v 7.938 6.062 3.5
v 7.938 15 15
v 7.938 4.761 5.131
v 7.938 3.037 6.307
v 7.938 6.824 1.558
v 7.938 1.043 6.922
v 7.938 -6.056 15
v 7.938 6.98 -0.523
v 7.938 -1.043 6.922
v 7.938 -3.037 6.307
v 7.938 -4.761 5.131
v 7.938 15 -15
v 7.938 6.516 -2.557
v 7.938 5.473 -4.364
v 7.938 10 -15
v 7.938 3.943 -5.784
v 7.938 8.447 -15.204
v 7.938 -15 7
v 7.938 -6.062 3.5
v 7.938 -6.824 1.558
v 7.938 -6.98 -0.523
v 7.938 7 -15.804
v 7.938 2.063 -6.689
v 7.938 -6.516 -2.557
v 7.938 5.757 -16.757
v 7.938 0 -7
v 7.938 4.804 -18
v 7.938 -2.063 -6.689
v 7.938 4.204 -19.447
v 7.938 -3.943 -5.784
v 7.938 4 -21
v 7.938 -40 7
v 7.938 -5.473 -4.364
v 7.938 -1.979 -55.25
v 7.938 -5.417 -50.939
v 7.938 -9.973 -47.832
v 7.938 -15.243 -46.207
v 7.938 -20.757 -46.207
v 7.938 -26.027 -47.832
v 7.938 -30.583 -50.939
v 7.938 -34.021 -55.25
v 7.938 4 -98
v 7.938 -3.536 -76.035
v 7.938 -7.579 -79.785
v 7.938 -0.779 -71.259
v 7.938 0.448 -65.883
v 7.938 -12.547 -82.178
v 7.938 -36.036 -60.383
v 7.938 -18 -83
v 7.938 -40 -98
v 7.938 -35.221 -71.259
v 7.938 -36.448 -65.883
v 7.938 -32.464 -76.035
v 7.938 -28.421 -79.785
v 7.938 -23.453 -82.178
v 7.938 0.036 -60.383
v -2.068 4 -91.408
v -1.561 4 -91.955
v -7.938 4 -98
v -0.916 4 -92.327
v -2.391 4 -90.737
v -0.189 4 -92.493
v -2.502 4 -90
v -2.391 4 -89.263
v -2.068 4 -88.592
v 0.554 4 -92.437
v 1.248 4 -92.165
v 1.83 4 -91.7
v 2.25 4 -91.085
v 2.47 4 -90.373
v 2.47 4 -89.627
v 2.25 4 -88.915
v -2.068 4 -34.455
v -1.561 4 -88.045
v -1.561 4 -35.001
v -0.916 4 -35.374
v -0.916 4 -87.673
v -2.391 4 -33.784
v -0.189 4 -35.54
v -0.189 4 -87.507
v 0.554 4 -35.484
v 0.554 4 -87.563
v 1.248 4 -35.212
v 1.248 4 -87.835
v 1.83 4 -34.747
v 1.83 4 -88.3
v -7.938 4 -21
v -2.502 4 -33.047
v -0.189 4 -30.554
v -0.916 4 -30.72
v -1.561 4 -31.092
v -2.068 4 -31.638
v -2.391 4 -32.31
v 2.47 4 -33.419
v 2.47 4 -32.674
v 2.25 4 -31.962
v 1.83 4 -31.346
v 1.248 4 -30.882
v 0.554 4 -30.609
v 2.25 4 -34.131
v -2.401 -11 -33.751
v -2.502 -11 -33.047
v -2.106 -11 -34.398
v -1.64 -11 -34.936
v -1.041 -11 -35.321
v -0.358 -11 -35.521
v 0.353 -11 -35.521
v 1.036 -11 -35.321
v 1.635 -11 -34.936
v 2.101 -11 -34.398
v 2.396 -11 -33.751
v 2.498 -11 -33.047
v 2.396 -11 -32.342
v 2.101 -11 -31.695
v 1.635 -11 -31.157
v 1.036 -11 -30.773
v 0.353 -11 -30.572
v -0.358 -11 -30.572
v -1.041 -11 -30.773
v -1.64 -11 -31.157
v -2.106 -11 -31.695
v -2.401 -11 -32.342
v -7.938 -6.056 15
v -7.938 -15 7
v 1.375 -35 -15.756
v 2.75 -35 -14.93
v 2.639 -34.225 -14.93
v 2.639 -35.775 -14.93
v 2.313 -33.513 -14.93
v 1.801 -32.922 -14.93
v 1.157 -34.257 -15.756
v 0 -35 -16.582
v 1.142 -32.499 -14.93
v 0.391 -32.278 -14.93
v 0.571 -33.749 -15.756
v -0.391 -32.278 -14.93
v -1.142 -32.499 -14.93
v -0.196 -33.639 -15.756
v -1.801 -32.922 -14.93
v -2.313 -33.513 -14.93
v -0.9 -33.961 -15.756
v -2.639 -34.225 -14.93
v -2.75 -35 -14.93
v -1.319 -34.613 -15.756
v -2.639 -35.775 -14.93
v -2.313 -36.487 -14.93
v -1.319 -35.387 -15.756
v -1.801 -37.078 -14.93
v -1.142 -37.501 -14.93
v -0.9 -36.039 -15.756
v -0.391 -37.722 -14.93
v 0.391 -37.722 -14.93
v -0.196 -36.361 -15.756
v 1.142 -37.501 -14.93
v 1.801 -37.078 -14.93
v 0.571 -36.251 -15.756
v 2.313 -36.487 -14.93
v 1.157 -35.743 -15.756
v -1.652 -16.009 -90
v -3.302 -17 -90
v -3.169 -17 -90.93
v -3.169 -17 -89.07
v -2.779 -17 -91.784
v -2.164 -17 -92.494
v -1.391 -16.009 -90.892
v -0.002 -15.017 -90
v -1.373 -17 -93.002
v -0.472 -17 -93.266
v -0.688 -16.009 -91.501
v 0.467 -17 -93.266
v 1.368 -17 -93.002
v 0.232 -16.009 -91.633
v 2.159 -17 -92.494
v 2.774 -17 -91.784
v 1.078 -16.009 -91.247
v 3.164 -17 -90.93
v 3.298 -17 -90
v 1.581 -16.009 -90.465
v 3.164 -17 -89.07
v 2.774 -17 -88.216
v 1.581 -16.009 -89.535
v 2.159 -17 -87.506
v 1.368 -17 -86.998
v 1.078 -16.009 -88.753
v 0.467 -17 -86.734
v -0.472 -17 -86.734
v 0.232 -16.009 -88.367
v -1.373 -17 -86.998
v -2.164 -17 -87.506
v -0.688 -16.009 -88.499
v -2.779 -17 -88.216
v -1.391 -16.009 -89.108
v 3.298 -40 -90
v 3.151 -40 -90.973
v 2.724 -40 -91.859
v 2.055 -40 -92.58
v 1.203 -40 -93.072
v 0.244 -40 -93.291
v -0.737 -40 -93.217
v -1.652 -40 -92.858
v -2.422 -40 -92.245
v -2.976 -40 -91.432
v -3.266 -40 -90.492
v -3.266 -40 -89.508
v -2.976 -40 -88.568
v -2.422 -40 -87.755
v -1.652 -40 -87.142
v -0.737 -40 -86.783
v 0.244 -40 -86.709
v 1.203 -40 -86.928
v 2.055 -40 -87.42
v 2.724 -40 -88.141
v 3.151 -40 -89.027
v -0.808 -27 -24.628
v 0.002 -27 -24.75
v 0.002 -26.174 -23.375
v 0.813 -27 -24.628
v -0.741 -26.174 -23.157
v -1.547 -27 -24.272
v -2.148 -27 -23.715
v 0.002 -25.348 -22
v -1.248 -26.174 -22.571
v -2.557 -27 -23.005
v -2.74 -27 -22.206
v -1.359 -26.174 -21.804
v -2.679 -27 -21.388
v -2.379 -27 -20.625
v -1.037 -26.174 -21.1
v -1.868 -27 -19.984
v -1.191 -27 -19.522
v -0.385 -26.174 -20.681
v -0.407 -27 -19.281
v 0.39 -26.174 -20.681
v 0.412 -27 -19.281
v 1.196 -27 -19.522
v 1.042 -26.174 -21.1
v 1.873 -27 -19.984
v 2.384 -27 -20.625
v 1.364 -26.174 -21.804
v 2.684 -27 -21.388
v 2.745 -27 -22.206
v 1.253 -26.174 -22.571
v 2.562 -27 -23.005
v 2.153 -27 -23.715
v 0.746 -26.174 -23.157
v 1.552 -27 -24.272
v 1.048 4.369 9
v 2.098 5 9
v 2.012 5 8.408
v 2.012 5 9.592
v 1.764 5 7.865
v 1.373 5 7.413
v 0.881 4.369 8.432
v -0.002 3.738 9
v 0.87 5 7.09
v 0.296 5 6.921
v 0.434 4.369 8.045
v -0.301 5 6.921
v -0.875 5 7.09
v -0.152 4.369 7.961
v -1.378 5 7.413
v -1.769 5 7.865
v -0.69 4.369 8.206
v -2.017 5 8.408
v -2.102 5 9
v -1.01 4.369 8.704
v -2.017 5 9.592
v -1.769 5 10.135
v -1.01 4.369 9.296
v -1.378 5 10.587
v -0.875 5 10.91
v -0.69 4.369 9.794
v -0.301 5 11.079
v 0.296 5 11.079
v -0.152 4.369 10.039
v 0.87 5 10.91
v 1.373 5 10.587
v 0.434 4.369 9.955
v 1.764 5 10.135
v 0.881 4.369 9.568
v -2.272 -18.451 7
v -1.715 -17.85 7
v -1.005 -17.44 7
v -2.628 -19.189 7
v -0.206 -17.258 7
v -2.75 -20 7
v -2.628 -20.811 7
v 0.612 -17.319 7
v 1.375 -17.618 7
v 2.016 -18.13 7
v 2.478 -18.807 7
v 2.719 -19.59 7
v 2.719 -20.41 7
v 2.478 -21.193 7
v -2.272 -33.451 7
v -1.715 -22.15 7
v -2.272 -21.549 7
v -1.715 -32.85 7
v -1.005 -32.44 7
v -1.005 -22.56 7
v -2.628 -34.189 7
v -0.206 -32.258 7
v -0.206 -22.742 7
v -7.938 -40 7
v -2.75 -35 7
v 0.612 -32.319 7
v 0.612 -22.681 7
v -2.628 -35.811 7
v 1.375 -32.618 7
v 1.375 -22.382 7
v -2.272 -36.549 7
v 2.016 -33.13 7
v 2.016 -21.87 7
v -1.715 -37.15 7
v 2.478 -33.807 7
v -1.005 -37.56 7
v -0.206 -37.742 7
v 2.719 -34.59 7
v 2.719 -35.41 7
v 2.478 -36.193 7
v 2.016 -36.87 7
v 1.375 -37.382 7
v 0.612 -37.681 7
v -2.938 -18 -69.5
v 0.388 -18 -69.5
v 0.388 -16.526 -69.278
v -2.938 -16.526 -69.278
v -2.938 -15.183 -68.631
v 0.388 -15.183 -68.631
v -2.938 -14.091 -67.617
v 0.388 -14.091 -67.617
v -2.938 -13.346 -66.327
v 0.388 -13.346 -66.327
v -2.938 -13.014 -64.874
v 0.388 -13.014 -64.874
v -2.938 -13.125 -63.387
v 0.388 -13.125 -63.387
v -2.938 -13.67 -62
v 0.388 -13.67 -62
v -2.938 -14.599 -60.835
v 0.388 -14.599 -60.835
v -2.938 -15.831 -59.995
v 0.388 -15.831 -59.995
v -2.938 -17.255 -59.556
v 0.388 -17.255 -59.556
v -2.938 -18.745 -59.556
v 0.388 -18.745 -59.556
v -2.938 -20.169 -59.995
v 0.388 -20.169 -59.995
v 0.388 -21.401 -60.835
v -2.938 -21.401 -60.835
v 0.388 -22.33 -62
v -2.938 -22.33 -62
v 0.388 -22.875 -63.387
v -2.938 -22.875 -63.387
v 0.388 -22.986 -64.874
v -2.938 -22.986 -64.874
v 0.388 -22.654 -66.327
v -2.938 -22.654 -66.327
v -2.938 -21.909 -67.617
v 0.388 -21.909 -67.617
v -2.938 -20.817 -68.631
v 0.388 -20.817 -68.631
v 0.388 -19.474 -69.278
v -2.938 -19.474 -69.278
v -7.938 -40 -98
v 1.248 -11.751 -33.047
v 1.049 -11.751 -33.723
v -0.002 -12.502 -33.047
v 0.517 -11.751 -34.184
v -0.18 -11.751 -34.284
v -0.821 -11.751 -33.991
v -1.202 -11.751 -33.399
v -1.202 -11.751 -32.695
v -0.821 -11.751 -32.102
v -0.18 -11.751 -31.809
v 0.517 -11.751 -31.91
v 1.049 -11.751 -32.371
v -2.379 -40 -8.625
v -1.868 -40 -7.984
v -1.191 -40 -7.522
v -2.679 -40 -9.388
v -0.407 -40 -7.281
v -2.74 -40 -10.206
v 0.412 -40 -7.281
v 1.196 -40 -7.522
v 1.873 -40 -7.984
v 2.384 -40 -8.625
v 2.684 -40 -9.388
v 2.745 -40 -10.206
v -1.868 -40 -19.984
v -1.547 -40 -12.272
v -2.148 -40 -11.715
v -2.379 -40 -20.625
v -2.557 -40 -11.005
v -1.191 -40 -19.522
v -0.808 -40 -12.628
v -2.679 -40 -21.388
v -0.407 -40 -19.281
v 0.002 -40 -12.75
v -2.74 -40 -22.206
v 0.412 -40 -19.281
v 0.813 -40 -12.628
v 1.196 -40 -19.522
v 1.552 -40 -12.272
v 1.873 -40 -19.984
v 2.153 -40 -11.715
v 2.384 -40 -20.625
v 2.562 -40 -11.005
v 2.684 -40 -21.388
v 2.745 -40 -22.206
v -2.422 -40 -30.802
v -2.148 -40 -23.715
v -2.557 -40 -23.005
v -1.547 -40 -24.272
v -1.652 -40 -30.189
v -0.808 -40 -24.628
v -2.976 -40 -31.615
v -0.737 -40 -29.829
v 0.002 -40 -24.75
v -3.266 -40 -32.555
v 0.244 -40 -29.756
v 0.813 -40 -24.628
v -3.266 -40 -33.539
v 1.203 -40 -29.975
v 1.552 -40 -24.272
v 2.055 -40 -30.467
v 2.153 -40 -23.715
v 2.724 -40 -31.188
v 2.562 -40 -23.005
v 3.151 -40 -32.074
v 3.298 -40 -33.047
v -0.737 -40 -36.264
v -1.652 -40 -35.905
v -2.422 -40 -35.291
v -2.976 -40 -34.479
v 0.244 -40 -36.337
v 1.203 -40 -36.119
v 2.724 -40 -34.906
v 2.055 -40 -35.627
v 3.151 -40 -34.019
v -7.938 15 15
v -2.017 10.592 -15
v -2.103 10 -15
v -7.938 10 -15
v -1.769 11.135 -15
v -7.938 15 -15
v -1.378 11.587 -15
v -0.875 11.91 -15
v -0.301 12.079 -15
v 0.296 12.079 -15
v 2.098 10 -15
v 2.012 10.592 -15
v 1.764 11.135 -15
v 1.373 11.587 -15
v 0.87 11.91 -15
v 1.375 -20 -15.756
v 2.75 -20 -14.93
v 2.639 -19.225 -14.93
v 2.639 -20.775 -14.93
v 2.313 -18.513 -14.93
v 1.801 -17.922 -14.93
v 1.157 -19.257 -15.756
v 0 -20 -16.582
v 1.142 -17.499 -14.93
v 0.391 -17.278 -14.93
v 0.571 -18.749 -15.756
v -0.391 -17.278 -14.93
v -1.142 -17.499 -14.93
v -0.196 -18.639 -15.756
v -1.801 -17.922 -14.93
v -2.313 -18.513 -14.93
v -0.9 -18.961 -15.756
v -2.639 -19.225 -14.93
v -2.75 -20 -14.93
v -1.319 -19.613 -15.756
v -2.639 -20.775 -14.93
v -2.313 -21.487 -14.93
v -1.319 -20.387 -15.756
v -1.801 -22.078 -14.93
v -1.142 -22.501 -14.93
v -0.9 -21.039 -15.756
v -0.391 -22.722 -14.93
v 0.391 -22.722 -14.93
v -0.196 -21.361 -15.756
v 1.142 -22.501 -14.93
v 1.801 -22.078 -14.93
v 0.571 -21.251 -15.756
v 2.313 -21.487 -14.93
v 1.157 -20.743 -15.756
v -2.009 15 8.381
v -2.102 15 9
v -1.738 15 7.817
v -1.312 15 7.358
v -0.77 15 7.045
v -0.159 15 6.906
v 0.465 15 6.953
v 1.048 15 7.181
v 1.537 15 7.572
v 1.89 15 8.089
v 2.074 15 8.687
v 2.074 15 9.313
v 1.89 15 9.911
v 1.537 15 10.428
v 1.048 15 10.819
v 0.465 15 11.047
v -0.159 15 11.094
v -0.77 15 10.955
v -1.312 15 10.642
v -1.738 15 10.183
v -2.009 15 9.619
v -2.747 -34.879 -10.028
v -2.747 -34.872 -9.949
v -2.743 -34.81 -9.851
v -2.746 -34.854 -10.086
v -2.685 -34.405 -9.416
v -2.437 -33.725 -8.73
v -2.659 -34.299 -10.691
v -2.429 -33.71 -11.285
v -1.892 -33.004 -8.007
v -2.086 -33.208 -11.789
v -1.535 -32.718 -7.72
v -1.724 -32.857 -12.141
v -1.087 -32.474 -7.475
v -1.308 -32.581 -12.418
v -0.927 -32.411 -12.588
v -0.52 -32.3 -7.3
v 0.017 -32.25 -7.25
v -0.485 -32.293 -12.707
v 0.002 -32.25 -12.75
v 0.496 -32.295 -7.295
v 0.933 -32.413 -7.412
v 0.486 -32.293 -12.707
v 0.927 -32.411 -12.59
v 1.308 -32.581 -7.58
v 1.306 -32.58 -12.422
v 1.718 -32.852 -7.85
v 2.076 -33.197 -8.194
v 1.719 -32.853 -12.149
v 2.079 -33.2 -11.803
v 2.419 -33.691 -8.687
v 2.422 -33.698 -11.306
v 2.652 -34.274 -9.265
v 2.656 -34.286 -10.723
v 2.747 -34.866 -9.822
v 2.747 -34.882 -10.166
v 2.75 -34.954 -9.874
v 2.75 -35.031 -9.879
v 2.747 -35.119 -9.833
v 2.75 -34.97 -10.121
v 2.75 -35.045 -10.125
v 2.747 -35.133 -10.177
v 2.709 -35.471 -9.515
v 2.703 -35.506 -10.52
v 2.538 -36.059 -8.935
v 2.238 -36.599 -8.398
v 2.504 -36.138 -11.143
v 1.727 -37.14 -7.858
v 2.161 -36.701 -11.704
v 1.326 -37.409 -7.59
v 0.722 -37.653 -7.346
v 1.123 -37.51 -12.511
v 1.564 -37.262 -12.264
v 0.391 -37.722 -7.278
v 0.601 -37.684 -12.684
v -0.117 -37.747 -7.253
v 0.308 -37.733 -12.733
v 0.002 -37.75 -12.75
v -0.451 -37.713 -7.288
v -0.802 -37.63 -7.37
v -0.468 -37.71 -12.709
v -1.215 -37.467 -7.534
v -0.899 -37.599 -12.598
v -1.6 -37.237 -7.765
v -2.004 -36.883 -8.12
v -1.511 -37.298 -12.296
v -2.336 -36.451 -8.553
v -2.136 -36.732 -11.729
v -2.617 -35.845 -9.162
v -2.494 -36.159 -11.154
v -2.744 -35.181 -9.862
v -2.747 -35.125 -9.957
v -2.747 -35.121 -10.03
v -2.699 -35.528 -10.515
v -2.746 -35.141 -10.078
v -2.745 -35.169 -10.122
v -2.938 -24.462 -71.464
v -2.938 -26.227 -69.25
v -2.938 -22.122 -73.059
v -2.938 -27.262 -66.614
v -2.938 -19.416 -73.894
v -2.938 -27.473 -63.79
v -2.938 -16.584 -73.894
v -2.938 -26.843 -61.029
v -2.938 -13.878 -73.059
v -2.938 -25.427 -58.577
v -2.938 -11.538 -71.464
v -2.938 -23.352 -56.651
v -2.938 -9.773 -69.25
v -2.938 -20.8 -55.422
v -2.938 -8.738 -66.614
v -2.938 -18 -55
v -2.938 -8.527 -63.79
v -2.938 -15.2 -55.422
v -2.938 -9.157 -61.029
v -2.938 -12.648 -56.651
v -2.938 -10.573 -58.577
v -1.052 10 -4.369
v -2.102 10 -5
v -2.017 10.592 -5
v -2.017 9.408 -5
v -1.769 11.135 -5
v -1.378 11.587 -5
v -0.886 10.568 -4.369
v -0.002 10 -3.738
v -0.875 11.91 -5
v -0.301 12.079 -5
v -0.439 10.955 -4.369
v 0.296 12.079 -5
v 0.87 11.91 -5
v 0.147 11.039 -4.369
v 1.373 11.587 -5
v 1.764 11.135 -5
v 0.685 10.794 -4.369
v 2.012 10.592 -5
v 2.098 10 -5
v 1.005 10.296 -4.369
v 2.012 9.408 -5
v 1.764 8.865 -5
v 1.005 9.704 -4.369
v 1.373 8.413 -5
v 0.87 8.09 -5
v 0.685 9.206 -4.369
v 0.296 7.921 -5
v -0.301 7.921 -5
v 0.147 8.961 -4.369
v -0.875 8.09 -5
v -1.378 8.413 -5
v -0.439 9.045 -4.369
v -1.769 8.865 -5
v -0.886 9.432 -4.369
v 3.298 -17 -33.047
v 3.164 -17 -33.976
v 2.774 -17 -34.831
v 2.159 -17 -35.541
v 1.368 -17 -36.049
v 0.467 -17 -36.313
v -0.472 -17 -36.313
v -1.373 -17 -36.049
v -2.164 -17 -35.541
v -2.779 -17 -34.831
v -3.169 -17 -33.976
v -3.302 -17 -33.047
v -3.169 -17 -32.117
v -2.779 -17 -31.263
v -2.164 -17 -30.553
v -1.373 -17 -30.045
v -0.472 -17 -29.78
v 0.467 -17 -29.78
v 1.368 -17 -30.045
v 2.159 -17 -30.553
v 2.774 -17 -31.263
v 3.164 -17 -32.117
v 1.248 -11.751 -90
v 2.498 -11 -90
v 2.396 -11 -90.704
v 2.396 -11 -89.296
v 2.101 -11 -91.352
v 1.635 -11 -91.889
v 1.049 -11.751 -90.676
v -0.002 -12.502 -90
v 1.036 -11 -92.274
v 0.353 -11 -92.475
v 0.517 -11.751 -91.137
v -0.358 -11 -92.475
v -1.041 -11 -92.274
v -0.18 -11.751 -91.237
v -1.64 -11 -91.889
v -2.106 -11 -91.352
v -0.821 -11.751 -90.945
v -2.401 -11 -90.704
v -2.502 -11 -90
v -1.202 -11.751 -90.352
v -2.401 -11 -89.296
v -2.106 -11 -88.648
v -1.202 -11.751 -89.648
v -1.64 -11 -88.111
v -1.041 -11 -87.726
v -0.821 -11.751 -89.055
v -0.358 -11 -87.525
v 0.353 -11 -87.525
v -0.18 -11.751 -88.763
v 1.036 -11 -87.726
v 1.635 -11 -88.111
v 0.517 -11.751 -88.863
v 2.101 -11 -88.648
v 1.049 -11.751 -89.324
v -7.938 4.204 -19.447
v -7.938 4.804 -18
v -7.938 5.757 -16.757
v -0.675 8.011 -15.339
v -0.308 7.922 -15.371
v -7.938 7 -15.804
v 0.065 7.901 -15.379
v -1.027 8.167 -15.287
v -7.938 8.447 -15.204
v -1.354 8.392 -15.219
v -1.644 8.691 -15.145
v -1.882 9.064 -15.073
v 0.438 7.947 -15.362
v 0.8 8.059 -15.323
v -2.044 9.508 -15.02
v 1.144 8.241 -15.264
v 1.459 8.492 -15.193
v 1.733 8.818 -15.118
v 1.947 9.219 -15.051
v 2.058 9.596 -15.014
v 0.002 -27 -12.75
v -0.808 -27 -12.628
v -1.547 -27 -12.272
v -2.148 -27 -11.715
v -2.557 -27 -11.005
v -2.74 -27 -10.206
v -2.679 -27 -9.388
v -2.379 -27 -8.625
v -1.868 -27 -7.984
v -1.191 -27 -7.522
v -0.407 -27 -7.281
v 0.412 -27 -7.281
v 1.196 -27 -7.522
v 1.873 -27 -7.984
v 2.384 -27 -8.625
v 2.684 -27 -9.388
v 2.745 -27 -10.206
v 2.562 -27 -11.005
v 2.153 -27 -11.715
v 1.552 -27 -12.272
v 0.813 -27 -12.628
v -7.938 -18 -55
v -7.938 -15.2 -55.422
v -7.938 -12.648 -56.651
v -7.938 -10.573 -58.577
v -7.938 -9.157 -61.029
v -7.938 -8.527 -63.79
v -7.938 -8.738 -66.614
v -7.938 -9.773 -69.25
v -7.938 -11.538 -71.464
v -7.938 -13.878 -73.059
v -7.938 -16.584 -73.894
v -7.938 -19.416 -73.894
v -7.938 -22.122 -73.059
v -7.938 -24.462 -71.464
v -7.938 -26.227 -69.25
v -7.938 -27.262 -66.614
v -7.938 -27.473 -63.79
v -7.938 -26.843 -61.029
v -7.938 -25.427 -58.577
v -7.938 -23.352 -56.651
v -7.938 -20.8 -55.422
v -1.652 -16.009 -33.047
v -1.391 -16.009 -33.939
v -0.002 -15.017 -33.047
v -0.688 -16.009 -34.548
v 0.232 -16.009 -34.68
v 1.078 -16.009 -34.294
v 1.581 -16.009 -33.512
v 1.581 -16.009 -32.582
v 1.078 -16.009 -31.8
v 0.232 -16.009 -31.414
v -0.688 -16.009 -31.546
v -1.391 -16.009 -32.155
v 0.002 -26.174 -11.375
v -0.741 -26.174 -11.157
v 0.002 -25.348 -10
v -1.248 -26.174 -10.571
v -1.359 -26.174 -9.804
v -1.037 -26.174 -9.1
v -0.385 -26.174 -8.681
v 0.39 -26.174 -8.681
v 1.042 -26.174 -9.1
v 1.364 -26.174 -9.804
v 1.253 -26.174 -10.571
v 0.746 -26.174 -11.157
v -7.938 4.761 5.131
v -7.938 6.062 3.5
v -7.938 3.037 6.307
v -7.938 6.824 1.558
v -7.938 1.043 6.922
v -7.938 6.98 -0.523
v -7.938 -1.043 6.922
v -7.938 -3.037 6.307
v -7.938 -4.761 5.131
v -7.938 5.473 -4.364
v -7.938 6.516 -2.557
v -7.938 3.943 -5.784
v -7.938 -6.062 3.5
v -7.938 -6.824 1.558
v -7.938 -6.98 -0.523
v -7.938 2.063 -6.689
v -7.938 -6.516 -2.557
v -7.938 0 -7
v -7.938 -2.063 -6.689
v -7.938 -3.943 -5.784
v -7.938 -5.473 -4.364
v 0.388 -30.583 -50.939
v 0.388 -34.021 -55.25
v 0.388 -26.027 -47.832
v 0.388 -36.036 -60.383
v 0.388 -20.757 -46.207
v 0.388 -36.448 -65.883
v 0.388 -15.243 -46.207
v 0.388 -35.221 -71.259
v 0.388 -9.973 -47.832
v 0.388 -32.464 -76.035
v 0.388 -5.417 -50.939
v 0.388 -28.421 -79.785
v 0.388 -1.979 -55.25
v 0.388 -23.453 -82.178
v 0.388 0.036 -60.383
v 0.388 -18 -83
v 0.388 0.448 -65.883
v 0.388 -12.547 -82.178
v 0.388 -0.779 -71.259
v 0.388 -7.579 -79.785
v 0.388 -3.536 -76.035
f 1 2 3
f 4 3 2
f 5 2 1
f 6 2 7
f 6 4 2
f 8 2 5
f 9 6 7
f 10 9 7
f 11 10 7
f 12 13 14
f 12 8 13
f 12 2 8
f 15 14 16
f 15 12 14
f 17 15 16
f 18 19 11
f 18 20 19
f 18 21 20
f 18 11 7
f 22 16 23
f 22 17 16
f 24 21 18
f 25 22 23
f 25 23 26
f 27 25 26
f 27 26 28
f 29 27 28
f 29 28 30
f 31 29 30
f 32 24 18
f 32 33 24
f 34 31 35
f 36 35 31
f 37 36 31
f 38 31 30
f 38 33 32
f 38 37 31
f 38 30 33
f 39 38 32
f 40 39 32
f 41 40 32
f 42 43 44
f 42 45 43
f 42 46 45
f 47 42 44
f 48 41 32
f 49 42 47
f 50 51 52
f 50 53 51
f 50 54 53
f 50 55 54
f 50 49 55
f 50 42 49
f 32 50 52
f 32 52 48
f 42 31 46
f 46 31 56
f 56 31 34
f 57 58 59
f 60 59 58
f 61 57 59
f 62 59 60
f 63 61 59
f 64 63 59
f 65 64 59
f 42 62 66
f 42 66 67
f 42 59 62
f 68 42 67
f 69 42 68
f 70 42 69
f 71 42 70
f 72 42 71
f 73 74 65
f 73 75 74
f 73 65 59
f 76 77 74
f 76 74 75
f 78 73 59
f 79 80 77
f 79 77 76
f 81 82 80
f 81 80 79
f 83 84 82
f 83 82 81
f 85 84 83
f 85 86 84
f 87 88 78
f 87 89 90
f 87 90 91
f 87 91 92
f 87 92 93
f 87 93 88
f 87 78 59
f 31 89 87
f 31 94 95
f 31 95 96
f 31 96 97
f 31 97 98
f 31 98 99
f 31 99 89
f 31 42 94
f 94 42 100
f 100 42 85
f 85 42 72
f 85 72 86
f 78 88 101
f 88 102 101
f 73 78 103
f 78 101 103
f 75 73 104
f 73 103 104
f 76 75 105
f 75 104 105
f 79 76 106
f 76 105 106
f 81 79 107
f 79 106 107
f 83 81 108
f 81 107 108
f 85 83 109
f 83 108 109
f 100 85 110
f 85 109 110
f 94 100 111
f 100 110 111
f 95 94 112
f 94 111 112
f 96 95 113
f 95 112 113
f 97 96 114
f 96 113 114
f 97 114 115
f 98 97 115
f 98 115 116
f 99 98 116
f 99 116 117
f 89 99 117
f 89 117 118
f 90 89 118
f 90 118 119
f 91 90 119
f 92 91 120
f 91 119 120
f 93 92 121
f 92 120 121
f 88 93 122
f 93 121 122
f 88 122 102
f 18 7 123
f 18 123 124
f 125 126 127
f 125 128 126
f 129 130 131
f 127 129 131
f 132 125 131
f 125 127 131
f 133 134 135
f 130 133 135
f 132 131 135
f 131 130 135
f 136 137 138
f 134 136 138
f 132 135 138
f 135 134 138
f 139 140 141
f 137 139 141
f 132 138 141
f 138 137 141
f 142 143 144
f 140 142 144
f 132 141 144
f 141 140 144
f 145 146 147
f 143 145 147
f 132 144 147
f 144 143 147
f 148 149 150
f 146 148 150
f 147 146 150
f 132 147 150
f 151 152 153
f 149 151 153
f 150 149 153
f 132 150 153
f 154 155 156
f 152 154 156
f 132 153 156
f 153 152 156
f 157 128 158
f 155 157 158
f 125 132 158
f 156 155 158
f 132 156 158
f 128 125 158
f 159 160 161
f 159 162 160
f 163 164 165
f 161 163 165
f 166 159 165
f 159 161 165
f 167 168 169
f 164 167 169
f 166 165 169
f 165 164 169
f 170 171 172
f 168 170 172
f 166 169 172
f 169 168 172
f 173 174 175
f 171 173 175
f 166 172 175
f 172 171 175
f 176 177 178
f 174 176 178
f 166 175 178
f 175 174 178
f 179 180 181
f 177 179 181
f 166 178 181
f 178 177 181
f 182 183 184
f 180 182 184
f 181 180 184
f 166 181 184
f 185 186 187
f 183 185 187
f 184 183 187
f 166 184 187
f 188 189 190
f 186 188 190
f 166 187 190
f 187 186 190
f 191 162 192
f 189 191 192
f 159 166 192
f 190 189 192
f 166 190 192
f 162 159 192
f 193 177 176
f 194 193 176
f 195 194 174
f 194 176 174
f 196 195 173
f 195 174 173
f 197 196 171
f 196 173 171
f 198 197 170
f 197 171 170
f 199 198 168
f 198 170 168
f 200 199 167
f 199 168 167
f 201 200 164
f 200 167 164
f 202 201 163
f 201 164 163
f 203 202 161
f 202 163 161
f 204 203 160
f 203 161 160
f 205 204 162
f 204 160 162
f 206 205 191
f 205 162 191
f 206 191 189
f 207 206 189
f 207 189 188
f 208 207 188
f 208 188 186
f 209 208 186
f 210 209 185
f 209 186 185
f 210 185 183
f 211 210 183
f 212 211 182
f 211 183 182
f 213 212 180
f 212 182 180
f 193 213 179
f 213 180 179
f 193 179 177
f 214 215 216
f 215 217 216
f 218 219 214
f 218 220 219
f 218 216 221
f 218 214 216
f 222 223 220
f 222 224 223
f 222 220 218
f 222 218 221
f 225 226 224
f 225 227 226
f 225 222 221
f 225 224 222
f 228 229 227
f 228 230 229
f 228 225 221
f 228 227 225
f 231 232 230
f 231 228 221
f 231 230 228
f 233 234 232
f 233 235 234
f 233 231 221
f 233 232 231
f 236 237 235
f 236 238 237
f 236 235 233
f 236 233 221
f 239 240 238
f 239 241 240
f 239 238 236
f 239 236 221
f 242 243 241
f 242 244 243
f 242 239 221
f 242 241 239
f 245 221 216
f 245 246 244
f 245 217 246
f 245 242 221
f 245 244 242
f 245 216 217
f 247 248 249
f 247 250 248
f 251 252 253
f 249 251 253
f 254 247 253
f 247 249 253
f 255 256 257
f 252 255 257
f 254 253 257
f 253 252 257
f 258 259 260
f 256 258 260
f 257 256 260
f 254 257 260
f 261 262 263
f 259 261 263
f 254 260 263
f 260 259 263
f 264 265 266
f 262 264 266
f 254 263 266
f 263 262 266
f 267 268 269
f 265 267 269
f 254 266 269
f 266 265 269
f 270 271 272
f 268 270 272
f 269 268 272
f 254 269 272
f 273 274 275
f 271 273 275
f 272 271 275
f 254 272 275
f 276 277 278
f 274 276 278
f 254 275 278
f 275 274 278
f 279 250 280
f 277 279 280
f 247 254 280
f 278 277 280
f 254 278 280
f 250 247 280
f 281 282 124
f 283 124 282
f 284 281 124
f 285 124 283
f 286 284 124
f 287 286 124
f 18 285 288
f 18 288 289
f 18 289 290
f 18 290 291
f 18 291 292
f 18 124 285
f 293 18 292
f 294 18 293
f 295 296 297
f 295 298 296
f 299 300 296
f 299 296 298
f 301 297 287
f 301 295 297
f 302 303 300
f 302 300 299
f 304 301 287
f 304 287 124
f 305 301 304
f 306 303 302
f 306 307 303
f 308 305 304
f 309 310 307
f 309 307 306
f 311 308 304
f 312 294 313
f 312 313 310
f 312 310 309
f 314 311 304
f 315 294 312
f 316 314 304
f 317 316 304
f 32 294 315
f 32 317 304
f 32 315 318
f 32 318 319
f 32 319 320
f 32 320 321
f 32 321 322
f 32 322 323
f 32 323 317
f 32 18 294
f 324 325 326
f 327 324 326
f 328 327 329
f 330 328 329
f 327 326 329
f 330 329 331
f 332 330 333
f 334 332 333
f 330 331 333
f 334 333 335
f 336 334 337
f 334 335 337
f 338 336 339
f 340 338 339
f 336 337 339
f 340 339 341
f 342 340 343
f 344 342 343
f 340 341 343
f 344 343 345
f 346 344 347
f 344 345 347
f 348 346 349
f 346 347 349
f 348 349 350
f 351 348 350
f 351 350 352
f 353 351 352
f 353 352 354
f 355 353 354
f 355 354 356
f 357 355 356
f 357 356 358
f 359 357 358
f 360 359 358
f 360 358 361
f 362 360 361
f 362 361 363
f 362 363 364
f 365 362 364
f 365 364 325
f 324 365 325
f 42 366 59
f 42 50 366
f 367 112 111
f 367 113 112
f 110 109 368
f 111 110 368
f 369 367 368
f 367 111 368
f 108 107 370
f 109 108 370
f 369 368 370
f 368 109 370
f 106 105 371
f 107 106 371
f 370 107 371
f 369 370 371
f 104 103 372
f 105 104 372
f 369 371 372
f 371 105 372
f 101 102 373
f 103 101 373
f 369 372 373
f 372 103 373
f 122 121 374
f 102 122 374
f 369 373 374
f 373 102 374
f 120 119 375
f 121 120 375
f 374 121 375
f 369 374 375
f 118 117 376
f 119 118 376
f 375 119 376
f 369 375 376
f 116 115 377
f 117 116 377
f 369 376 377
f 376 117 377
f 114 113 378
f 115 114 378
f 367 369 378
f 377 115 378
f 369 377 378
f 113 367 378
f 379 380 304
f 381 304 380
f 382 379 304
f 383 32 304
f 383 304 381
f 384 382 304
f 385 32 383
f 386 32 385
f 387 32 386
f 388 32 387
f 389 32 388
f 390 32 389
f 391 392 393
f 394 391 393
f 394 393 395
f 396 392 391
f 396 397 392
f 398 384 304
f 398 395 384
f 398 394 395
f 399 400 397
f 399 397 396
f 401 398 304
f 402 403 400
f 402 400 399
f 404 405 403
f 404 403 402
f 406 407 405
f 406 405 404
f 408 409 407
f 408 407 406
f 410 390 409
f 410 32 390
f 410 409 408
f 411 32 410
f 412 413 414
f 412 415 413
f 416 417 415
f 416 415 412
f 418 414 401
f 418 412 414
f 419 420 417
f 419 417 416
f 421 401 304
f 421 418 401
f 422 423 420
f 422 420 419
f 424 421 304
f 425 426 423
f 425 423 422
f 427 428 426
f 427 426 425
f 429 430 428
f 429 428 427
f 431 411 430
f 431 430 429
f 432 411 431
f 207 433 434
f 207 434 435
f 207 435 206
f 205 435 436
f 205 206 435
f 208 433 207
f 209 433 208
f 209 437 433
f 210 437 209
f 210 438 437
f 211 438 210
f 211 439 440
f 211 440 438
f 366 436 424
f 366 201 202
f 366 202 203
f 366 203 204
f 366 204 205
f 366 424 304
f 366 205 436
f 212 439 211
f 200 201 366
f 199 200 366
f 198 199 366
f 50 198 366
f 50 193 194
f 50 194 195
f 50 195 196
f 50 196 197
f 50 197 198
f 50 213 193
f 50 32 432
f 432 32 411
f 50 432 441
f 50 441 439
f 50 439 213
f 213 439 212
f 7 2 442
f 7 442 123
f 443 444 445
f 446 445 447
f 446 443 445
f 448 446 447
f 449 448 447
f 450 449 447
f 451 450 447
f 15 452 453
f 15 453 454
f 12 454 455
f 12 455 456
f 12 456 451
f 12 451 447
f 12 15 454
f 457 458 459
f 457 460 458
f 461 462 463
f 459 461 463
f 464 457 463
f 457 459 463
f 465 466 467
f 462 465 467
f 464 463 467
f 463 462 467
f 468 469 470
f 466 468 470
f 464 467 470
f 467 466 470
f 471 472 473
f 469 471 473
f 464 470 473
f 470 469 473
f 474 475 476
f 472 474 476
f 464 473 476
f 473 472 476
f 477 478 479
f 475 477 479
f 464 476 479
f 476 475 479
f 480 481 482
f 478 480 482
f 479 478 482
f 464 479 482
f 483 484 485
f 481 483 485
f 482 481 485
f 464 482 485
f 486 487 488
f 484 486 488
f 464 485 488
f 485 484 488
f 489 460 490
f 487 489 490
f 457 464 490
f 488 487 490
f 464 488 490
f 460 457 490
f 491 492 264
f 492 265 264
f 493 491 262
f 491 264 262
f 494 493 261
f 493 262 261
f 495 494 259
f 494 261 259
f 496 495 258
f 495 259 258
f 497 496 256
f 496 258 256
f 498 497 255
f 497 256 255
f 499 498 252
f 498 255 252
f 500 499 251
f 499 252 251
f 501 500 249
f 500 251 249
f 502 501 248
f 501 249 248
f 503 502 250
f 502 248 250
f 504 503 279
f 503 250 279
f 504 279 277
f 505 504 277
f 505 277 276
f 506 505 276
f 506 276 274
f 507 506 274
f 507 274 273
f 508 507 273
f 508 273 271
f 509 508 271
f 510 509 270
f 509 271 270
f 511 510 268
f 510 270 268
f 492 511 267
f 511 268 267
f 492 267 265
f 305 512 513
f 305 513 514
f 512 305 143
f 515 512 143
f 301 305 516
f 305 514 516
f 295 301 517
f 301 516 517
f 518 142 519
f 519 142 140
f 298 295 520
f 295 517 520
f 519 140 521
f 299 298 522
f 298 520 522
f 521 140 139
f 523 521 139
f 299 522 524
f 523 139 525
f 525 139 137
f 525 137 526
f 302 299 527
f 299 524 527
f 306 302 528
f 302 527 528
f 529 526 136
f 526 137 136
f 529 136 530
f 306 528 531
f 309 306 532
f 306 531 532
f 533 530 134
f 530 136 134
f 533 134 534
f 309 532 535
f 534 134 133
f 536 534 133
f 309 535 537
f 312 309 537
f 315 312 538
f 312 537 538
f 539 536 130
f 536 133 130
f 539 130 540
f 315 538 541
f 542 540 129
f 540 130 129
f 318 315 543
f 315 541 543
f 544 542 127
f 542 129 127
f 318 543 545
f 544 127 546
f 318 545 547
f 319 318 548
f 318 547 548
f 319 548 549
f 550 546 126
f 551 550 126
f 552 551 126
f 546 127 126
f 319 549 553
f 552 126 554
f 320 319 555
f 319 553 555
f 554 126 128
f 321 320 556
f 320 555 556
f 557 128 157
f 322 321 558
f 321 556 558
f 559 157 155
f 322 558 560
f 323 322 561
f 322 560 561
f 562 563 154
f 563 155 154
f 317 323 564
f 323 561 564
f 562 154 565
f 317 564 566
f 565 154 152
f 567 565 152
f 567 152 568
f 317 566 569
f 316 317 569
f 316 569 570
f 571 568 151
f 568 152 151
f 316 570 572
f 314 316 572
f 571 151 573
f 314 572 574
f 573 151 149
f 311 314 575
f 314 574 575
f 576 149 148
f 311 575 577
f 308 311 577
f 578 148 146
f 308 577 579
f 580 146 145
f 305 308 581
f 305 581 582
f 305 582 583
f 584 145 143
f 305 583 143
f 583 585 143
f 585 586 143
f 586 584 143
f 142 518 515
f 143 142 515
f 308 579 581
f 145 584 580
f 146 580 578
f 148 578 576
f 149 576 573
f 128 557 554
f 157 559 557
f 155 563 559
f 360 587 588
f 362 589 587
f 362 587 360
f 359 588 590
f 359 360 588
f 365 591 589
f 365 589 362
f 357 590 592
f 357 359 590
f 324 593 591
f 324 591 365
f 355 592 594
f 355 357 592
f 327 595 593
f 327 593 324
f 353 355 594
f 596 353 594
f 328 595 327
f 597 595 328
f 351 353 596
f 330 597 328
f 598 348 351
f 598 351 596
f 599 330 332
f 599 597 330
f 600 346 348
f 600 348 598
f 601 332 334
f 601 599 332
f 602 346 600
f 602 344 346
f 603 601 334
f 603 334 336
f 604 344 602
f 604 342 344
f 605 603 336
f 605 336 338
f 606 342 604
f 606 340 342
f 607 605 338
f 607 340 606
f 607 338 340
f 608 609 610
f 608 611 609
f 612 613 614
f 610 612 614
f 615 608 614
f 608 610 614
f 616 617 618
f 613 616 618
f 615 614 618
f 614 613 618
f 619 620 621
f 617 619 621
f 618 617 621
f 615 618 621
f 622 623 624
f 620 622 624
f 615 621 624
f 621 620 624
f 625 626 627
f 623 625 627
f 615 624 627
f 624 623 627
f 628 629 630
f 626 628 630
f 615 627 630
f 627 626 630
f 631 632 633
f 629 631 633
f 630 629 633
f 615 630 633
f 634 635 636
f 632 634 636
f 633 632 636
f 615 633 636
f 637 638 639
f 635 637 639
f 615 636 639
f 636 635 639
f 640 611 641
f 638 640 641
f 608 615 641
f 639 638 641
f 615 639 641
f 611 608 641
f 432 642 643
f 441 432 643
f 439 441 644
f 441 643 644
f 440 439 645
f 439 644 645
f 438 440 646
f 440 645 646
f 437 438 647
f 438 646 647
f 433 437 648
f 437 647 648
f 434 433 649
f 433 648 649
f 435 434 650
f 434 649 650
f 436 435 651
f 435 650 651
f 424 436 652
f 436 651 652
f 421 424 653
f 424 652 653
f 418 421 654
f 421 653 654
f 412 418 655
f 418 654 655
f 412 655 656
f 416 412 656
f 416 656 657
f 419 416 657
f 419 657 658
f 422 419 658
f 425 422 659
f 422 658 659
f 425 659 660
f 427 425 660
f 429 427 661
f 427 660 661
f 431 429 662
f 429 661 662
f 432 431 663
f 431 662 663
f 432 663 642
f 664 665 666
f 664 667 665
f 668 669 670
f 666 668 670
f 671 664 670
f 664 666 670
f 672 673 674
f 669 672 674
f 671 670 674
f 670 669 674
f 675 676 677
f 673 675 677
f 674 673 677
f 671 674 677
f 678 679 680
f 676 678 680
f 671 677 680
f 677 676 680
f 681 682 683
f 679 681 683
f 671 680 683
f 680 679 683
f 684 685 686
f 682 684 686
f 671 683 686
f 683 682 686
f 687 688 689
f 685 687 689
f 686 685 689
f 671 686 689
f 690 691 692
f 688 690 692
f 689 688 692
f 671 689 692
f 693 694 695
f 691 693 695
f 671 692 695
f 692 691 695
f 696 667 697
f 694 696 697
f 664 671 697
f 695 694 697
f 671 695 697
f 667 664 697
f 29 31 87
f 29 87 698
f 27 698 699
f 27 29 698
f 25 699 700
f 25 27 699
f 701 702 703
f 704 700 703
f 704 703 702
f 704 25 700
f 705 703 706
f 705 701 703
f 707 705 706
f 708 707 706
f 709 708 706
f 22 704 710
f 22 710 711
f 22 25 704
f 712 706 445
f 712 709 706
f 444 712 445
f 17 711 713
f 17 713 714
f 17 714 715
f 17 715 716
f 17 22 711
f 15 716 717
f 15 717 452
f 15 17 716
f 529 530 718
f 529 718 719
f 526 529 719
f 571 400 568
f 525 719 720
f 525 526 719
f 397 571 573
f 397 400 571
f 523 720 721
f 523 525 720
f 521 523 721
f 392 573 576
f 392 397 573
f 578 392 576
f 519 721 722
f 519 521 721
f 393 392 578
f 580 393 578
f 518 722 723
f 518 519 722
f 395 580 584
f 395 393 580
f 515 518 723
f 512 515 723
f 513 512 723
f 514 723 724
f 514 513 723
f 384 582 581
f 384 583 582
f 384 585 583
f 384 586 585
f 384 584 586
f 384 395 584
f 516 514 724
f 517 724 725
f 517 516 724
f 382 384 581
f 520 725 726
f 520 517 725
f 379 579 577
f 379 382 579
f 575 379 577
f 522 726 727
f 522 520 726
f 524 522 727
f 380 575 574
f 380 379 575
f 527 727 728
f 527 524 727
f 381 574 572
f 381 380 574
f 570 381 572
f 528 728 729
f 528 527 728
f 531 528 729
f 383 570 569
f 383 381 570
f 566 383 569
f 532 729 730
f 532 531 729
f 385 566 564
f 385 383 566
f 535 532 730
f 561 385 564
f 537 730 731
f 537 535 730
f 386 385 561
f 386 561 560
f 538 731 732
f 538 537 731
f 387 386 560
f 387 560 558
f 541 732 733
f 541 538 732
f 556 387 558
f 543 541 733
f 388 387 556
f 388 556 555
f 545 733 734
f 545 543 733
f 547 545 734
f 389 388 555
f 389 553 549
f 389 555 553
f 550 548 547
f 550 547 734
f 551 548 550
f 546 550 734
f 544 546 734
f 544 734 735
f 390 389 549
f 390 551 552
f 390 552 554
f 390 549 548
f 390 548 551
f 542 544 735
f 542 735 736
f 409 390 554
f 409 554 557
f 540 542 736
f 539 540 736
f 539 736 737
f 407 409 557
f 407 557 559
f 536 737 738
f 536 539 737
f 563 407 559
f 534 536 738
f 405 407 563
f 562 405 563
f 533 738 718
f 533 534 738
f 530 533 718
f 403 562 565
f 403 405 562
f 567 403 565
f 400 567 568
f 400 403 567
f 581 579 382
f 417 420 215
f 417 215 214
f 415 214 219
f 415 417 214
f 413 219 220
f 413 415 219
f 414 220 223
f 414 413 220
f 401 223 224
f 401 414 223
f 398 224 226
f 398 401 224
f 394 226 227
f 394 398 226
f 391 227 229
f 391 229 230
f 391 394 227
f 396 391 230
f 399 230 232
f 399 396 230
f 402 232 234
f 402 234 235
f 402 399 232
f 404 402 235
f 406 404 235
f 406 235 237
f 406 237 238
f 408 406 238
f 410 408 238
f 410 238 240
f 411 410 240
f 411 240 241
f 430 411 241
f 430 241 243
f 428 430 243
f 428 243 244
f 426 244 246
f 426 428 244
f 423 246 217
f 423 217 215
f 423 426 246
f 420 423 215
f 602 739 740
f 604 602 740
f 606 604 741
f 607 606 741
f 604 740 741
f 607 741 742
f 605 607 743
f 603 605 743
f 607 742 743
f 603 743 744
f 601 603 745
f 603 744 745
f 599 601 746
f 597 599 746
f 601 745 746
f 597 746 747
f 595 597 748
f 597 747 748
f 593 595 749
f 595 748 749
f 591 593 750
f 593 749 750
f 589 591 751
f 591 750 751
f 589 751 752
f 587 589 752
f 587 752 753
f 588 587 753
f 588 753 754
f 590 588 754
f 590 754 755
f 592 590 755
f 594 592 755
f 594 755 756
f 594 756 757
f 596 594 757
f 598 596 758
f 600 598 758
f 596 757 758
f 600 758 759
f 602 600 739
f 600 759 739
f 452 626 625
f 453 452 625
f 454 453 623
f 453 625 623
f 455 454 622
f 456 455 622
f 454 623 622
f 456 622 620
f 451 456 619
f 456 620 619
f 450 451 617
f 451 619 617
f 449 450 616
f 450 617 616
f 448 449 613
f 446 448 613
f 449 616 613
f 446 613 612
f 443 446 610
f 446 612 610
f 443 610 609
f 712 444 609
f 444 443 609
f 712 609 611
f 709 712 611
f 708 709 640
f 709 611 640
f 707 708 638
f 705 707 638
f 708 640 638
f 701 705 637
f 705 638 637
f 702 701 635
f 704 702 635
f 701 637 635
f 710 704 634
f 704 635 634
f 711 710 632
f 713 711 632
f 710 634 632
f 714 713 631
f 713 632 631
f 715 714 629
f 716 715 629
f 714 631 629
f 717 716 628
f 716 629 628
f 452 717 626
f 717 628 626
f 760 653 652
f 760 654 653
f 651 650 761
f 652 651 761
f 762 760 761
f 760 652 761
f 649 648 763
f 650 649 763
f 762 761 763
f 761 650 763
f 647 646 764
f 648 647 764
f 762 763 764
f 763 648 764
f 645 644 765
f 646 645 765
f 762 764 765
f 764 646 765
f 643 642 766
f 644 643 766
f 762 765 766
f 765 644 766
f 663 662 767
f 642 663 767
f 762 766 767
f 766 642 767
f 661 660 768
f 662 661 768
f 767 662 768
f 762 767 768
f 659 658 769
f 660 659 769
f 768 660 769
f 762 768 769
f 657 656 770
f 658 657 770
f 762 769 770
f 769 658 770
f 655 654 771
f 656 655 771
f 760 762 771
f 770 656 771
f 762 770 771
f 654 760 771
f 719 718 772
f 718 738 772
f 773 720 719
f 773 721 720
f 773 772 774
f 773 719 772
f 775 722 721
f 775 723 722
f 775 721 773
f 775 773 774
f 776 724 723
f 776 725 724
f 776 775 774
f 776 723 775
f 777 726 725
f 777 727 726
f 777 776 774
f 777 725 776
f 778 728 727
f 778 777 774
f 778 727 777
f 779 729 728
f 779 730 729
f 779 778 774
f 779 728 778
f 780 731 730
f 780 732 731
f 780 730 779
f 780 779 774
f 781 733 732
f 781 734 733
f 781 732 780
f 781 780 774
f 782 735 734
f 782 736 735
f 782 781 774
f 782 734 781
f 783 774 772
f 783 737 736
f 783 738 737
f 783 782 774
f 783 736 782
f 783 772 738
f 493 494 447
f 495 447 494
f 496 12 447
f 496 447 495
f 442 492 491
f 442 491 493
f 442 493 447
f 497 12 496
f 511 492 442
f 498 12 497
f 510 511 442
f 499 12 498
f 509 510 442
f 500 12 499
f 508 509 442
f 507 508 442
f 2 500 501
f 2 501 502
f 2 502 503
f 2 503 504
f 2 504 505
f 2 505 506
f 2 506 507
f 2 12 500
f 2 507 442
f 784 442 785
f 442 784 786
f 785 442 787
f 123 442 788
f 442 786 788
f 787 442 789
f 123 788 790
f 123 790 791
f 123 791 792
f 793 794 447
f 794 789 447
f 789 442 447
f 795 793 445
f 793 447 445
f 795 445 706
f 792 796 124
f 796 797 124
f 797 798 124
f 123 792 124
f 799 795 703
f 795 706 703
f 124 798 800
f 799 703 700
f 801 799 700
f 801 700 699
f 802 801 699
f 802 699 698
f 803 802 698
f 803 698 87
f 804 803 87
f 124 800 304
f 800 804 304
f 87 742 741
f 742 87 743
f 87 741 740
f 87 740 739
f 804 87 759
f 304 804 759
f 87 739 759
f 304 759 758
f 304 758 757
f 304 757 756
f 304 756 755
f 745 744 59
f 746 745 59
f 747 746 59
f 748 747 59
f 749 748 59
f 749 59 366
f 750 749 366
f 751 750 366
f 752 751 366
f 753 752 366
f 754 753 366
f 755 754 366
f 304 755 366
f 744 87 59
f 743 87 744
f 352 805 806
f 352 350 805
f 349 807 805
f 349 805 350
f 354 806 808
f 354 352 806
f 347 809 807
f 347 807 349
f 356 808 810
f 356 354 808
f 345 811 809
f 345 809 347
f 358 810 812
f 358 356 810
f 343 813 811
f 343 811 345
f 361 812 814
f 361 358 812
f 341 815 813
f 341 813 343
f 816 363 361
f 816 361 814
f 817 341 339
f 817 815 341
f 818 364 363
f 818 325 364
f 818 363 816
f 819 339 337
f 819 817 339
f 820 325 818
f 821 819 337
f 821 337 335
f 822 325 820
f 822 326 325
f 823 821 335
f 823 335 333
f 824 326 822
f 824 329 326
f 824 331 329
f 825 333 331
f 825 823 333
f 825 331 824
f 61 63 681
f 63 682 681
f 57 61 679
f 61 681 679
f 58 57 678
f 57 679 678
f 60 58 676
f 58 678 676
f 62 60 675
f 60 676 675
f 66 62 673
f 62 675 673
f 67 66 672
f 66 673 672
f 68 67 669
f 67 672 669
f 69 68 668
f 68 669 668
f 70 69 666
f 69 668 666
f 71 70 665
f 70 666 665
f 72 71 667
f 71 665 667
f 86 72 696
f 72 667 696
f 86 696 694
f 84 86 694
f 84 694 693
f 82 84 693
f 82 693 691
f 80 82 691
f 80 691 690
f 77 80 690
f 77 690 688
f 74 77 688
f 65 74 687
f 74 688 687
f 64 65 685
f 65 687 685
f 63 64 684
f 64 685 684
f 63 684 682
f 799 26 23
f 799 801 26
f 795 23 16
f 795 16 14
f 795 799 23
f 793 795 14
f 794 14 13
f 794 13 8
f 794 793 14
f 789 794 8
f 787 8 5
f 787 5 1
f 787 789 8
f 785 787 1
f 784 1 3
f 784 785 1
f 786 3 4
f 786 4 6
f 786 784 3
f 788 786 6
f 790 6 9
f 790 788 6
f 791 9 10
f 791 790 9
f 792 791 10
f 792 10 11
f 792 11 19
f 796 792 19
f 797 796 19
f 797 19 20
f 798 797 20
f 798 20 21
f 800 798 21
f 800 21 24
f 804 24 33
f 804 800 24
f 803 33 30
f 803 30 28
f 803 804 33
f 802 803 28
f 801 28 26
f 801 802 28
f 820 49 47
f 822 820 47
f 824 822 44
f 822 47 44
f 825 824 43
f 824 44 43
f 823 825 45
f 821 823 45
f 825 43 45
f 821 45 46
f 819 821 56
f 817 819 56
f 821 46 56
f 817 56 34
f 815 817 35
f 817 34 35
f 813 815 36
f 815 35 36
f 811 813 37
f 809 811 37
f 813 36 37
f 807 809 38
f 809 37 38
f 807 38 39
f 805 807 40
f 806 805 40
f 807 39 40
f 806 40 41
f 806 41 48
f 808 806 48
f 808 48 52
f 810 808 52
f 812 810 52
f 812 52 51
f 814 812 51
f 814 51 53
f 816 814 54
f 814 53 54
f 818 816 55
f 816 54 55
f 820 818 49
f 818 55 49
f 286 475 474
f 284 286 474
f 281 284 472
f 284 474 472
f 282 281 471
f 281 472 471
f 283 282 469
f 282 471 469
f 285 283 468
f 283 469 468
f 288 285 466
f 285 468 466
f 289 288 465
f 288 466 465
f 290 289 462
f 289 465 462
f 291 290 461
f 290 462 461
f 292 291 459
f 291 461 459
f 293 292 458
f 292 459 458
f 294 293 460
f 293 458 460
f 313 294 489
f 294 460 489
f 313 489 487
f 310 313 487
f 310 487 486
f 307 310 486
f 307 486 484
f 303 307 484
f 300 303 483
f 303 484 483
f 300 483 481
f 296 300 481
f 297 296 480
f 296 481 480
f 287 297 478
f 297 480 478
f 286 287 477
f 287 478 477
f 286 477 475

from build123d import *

# Parameters (mm, degrees)
ESBO_O1_R                                            = 7
RESSALTO_EXTRUS_O1_DEPTH                             = 7.9375
ESCAREADO_PARA_PARAFUSO_DE_M_QUINA_COM_C_D           = 5.5
ESCAREADO_PARA_PARAFUSO_DE_M_QUINA_COM_C_DEPTH       = 30
ESCAREADO_PARA_PARAFUSO_DE_M_QUINA_COM_C_CSINK_D     = 10.4
ESCAREADO_PARA_PARAFUSO_DE_M_QUINA_COM_C_CSINK_ANGLE = 90
ESCAREADO_PARA_PARAFUSO_DE_M_QUINA_COM_C_TIP         = 1.652366702
ESCAREADO_PARA_PARAFUSO_DE_M_QUINA_C_2_D             = 6.6
ESCAREADO_PARA_PARAFUSO_DE_M_QUINA_C_2_DEPTH         = 30
ESCAREADO_PARA_PARAFUSO_DE_M_QUINA_C_2_CSINK_D       = 12.6
ESCAREADO_PARA_PARAFUSO_DE_M_QUINA_C_2_CSINK_ANGLE   = 90
ESCAREADO_PARA_PARAFUSO_DE_M_QUINA_C_2_TIP           = 1.982840043
BROCA_DE_ROSQUEAR_PARA_TARRAXA_DE_M5X0_8_D           = 4.2
BROCA_DE_ROSQUEAR_PARA_TARRAXA_DE_M5X0_8_DEPTH       = 20
BROCA_DE_ROSQUEAR_PARA_TARRAXA_DE_M5X0_8_TIP         = 1.2618073
BROCA_DE_ROSQUEAR_PARA_TARRAXA_DE_M5_2_D             = 4.2
BROCA_DE_ROSQUEAR_PARA_TARRAXA_DE_M5_2_DEPTH         = 20
BROCA_DE_ROSQUEAR_PARA_TARRAXA_DE_M5_2_TIP           = 1.2618073
BROCA_DE_ROSQUEAR_PARA_TARRAXA_DE_M6X1_0_D           = 5
BROCA_DE_ROSQUEAR_PARA_TARRAXA_DE_M6X1_0_DEPTH       = 15
BROCA_DE_ROSQUEAR_PARA_TARRAXA_DE_M6X1_0_TIP         = 1.502151548
ESCAREADO_PARA_SFHCS_M51_AT_2_COUNT                  = 2
ESCAREADO_PARA_SFHCS_M51_AT_2_PITCH                  = 12
ESCAREADO_PARA_SFHCS_M51_AT_3_COUNT                  = 2
ESCAREADO_PARA_SFHCS_M51_AT_3_PITCH                  = 67.209946437
ESCAREADO_PARA_SFHCS_M51_AT_4_COUNT                  = 2
ESCAREADO_PARA_SFHCS_M51_AT_4_PITCH                  = 66.13
SKETCH1_R                                            = 18.5
CUT_EXTRUDE1_DEPTH                                   = 7.55
SKETCH2_R                                            = 5
CUT_EXTRUDE2_DEPTH                                   = 107.175824146
SKETCH3_R                                            = 9.5
CUT_EXTRUDE3_DEPTH                                   = 5
FILLET1_R                                            = 6


with BuildPart() as part:
    # Esboço1 → Ressalto-extrusão1 (new, symmetric)
    with BuildSketch(Plane(origin=(0, 0, 0), x_dir=(0, 0, -1), z_dir=(1, 0, 0))):
        Polygon((15, 15), (-15, 15), (-15, -6.05572809), (-7, -15), (-7, -40), (98, -40), (98, 4), (15, 4), align=None)
        Circle(ESBO_O1_R, mode=Mode.SUBTRACT)
    extrude(amount=RESSALTO_EXTRUS_O1_DEPTH, both=True)

    # Escareado para parafuso de m_quina com c
    with Locations(Plane(origin=(-33.0625, -33.751665499, 15.070399895), x_dir=(1, 0, 0), z_dir=(0, 0, 1))):
        with Locations((-33.0625, 13.751665499), (-33.0625, -1.248334501), (33.0625, -1.248334501), (33.0625, 13.751665499)):
            CounterSinkHole(ESCAREADO_PARA_PARAFUSO_DE_M_QUINA_COM_C_D / 2, ESCAREADO_PARA_PARAFUSO_DE_M_QUINA_COM_C_CSINK_D / 2, depth=ESCAREADO_PARA_PARAFUSO_DE_M_QUINA_COM_C_DEPTH, counter_sink_angle=ESCAREADO_PARA_PARAFUSO_DE_M_QUINA_COM_C_CSINK_ANGLE)
            with Locations((0, 0, -(ESCAREADO_PARA_PARAFUSO_DE_M_QUINA_COM_C_DEPTH + ESCAREADO_PARA_PARAFUSO_DE_M_QUINA_COM_C_TIP / 2))):  # 118° drill point
                Cone(0, ESCAREADO_PARA_PARAFUSO_DE_M_QUINA_COM_C_D / 2, ESCAREADO_PARA_PARAFUSO_DE_M_QUINA_COM_C_TIP, mode=Mode.SUBTRACT)

    # Escareado para parafuso de m_quina c 2
    with Locations(Plane(origin=(-33.0625, -47, -36.460196829), x_dir=(-1, 0, 0), z_dir=(0, -1, 0))):
        with Locations((33.06, 49.586524306), (33.06, -3.413475694), (-33.06, -3.413475694), (-33.06, 53.539803171)):
            CounterSinkHole(ESCAREADO_PARA_PARAFUSO_DE_M_QUINA_C_2_D / 2, ESCAREADO_PARA_PARAFUSO_DE_M_QUINA_C_2_CSINK_D / 2, depth=ESCAREADO_PARA_PARAFUSO_DE_M_QUINA_C_2_DEPTH, counter_sink_angle=ESCAREADO_PARA_PARAFUSO_DE_M_QUINA_C_2_CSINK_ANGLE)
            with Locations((0, 0, -(ESCAREADO_PARA_PARAFUSO_DE_M_QUINA_C_2_DEPTH + ESCAREADO_PARA_PARAFUSO_DE_M_QUINA_C_2_TIP / 2))):  # 118° drill point
                Cone(0, ESCAREADO_PARA_PARAFUSO_DE_M_QUINA_C_2_D / 2, ESCAREADO_PARA_PARAFUSO_DE_M_QUINA_C_2_TIP, mode=Mode.SUBTRACT)

    # Broca de rosquear para tarraxa de M5x0.8
    with Locations(Plane(origin=(-33.0625, 25, -36.460196829), x_dir=(1, 0, 0), z_dir=(0, 1, 0))):
        with Locations((33.06, -45.460196829), (-33.065, -45.460196829)):
            Hole(BROCA_DE_ROSQUEAR_PARA_TARRAXA_DE_M5X0_8_D / 2, depth=BROCA_DE_ROSQUEAR_PARA_TARRAXA_DE_M5X0_8_DEPTH)
            with Locations((0, 0, -(BROCA_DE_ROSQUEAR_PARA_TARRAXA_DE_M5X0_8_DEPTH + BROCA_DE_ROSQUEAR_PARA_TARRAXA_DE_M5X0_8_TIP / 2))):  # 118° drill point
                Cone(0, BROCA_DE_ROSQUEAR_PARA_TARRAXA_DE_M5X0_8_D / 2, BROCA_DE_ROSQUEAR_PARA_TARRAXA_DE_M5X0_8_TIP, mode=Mode.SUBTRACT)

    # Broca de rosquear para tarraxa de M5 2
    with Locations(Plane(origin=(-33.0625, -33.751665499, -25), x_dir=(-1, 0, 0), z_dir=(0, 0, -1))):
        with Locations((-33.06, 43.751665499), (33.065, 43.751665499)):
            Hole(BROCA_DE_ROSQUEAR_PARA_TARRAXA_DE_M5_2_D / 2, depth=BROCA_DE_ROSQUEAR_PARA_TARRAXA_DE_M5_2_DEPTH)
            with Locations((0, 0, -(BROCA_DE_ROSQUEAR_PARA_TARRAXA_DE_M5_2_DEPTH + BROCA_DE_ROSQUEAR_PARA_TARRAXA_DE_M5_2_TIP / 2))):  # 118° drill point
                Cone(0, BROCA_DE_ROSQUEAR_PARA_TARRAXA_DE_M5_2_D / 2, BROCA_DE_ROSQUEAR_PARA_TARRAXA_DE_M5_2_TIP, mode=Mode.SUBTRACT)

    # Broca de rosquear para tarraxa de M6x1.01
    with Locations(Plane(origin=(-33.0625, 4, -36.460196829), x_dir=(1, 0, 0), z_dir=(0, 1, 0))):
        with Locations((33.06, 53.539803171), (-33.06, 49.539803171), (-33.06, -3.413475694), (33.06, -3.413475694)):
            Hole(BROCA_DE_ROSQUEAR_PARA_TARRAXA_DE_M6X1_0_D / 2, depth=BROCA_DE_ROSQUEAR_PARA_TARRAXA_DE_M6X1_0_DEPTH)
            with Locations((0, 0, -(BROCA_DE_ROSQUEAR_PARA_TARRAXA_DE_M6X1_0_DEPTH + BROCA_DE_ROSQUEAR_PARA_TARRAXA_DE_M6X1_0_TIP / 2))):  # 118° drill point
                Cone(0, BROCA_DE_ROSQUEAR_PARA_TARRAXA_DE_M6X1_0_D / 2, BROCA_DE_ROSQUEAR_PARA_TARRAXA_DE_M6X1_0_TIP, mode=Mode.SUBTRACT)

    # Esboço23 → Escareado para SFHCS M51 (revolve, cut)
    with BuildSketch(Plane(origin=(0.0025, -57, -22), x_dir=(0, 0, -1), z_dir=(1, 0, 0))):
        Polygon((0, 0), (0, 31.652366702), (2.75, 30), (2.75, 3.35), (5.6, 0.5), (5.6, 0), align=None)
    escareado_para_sfhcs_m51 = revolve(axis=Axis((0.0025, -63.35, -22), (0, 1, 0)), mode=Mode.SUBTRACT)

    # Escareado para SFHCS M51 at 2: Escareado para SFHCS M51 ×2
    with Locations(*[(0, 0, i * ESCAREADO_PARA_SFHCS_M51_AT_2_PITCH) for i in range(1, ESCAREADO_PARA_SFHCS_M51_AT_2_COUNT)]):
        add(escareado_para_sfhcs_m51, mode=Mode.SUBTRACT)

    # Escareado para SFHCS M51 at 3: Escareado para SFHCS M51 ×2
    with Locations(*[Vector(-0.9839317468056482, 0, 0.17854500168861012) * (i * ESCAREADO_PARA_SFHCS_M51_AT_3_PITCH) for i in range(1, ESCAREADO_PARA_SFHCS_M51_AT_3_COUNT)]):
        add(escareado_para_sfhcs_m51, mode=Mode.SUBTRACT)

    # Escareado para SFHCS M51 at 4: Escareado para SFHCS M51 ×2
    with Locations(*[(-i * ESCAREADO_PARA_SFHCS_M51_AT_4_PITCH, 0, 0) for i in range(1, ESCAREADO_PARA_SFHCS_M51_AT_4_COUNT)]):
        add(escareado_para_sfhcs_m51, mode=Mode.SUBTRACT)

    # Sketch1 → Cut-Extrude1 (cut)
    with BuildSketch(Plane(origin=(7.9375, 0, 0), x_dir=(0, 0, -1), z_dir=(1, 0, 0))):
        with Locations((64.5, -18)):
            Circle(SKETCH1_R)
    extrude(amount=-CUT_EXTRUDE1_DEPTH, mode=Mode.SUBTRACT)

    # Sketch2 → Cut-Extrude2 (cut, through all)
    with BuildSketch(Plane(origin=(0.3875, 0, 0), x_dir=(0, 0, -1), z_dir=(1, 0, 0))):
        with Locations((64.5, -18)):
            Circle(SKETCH2_R)
    extrude(amount=-CUT_EXTRUDE2_DEPTH, mode=Mode.SUBTRACT)

    # Sketch3 → Cut-Extrude3 (cut)
    with BuildSketch(Plane.ZY.offset(7.9375)):
        with Locations((-64.5, -18)):
            Circle(SKETCH3_R)
    extrude(amount=-CUT_EXTRUDE3_DEPTH, mode=Mode.SUBTRACT)

    # Fillet1
    # the kernel refuses this fillet: 6 mm, written as the material it adds along each edge
    with BuildSketch(Plane(origin=(7.9375, 4, -15), x_dir=(0, 1, 0), z_dir=(-1, 0, 0))) as fillet1_piece_1_section:
        with BuildLine():
            CenterArc((FILLET1_R, FILLET1_R), FILLET1_R, 180, 90)
            Line((0, FILLET1_R), (0, 0))
            Line((0, 0), (FILLET1_R, 0))
        make_face()
    fillet1_piece_1 = extrude(amount=15.875, mode=Mode.PRIVATE)
    fillet1_piece_1 = fillet1_piece_1 - Plane(origin=(-0.0025, 10, -16.372210647), x_dir=(1, 0, 0), z_dir=(0, 0, 1)) * Cylinder(2.1, 56, mode=Mode.PRIVATE)
    add(fillet1_piece_1)


solid = part.part
